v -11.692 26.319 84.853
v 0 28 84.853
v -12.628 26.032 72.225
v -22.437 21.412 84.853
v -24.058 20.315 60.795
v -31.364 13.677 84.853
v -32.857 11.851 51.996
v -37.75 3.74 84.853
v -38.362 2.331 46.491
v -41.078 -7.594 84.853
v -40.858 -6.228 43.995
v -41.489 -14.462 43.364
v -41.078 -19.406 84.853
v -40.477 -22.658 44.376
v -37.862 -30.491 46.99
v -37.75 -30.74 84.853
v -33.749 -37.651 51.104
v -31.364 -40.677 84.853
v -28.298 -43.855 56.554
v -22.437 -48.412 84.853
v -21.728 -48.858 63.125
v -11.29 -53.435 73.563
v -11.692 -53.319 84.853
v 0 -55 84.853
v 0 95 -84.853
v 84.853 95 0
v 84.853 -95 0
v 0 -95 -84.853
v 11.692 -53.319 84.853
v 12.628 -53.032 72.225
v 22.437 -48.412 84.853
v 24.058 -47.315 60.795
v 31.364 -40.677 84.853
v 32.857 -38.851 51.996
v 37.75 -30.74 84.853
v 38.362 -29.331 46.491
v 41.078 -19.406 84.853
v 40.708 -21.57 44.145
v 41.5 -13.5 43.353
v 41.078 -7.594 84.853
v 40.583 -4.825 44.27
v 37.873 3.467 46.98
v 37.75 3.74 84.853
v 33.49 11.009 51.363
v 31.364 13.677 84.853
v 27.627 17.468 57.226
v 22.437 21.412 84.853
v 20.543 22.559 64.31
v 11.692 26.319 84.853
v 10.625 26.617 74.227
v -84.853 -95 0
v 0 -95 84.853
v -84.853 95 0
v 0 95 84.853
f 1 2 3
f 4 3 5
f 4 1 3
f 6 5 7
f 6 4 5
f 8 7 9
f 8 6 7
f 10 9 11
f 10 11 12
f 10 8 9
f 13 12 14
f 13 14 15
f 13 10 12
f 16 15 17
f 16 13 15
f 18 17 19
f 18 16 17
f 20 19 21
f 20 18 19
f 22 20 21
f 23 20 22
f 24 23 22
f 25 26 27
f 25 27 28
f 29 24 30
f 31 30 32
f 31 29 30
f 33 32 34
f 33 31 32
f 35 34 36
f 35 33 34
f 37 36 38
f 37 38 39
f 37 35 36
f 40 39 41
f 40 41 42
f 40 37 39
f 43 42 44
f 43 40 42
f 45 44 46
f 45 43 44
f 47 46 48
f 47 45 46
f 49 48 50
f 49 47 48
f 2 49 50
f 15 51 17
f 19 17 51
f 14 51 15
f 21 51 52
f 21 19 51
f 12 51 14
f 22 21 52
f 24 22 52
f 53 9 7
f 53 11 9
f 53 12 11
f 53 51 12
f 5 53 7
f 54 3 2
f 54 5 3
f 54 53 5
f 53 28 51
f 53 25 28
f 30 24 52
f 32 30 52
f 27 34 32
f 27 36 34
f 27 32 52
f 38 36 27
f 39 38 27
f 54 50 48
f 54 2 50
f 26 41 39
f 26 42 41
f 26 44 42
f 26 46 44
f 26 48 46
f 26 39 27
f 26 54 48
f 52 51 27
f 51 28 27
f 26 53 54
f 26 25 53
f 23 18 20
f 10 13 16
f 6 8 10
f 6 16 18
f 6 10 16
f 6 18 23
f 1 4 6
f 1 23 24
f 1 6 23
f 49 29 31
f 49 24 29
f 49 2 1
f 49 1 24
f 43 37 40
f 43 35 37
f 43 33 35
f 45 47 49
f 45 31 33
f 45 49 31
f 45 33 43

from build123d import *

# Parameters (mm, degrees)
BOSS_EXTRUDE1_DEPTH = 95
SKETCH3_R           = 41.5
BOSS_EXTRUDE3_DEPTH = 45


with BuildPart() as part:
    # Sketch2 → Boss-Extrude1 (new body, symmetric)
    with BuildSketch(Plane(origin=(0, 0, 0), x_dir=(1, 0, 0), z_dir=(0, 1, 0))):
        Polygon((-84.852813742, 0), (0, -84.852813742), (84.852813742, 0), (0, 84.852813742), align=None)
    extrude(amount=BOSS_EXTRUDE1_DEPTH, both=True)

    # Sketch3 → Boss-Extrude3 (add)
    with BuildSketch(Plane.XY.offset(84.852813742)):
        with Locations((0, -13.5)):
            Circle(SKETCH3_R)
    extrude(amount=-BOSS_EXTRUDE3_DEPTH)


solid = part.part
